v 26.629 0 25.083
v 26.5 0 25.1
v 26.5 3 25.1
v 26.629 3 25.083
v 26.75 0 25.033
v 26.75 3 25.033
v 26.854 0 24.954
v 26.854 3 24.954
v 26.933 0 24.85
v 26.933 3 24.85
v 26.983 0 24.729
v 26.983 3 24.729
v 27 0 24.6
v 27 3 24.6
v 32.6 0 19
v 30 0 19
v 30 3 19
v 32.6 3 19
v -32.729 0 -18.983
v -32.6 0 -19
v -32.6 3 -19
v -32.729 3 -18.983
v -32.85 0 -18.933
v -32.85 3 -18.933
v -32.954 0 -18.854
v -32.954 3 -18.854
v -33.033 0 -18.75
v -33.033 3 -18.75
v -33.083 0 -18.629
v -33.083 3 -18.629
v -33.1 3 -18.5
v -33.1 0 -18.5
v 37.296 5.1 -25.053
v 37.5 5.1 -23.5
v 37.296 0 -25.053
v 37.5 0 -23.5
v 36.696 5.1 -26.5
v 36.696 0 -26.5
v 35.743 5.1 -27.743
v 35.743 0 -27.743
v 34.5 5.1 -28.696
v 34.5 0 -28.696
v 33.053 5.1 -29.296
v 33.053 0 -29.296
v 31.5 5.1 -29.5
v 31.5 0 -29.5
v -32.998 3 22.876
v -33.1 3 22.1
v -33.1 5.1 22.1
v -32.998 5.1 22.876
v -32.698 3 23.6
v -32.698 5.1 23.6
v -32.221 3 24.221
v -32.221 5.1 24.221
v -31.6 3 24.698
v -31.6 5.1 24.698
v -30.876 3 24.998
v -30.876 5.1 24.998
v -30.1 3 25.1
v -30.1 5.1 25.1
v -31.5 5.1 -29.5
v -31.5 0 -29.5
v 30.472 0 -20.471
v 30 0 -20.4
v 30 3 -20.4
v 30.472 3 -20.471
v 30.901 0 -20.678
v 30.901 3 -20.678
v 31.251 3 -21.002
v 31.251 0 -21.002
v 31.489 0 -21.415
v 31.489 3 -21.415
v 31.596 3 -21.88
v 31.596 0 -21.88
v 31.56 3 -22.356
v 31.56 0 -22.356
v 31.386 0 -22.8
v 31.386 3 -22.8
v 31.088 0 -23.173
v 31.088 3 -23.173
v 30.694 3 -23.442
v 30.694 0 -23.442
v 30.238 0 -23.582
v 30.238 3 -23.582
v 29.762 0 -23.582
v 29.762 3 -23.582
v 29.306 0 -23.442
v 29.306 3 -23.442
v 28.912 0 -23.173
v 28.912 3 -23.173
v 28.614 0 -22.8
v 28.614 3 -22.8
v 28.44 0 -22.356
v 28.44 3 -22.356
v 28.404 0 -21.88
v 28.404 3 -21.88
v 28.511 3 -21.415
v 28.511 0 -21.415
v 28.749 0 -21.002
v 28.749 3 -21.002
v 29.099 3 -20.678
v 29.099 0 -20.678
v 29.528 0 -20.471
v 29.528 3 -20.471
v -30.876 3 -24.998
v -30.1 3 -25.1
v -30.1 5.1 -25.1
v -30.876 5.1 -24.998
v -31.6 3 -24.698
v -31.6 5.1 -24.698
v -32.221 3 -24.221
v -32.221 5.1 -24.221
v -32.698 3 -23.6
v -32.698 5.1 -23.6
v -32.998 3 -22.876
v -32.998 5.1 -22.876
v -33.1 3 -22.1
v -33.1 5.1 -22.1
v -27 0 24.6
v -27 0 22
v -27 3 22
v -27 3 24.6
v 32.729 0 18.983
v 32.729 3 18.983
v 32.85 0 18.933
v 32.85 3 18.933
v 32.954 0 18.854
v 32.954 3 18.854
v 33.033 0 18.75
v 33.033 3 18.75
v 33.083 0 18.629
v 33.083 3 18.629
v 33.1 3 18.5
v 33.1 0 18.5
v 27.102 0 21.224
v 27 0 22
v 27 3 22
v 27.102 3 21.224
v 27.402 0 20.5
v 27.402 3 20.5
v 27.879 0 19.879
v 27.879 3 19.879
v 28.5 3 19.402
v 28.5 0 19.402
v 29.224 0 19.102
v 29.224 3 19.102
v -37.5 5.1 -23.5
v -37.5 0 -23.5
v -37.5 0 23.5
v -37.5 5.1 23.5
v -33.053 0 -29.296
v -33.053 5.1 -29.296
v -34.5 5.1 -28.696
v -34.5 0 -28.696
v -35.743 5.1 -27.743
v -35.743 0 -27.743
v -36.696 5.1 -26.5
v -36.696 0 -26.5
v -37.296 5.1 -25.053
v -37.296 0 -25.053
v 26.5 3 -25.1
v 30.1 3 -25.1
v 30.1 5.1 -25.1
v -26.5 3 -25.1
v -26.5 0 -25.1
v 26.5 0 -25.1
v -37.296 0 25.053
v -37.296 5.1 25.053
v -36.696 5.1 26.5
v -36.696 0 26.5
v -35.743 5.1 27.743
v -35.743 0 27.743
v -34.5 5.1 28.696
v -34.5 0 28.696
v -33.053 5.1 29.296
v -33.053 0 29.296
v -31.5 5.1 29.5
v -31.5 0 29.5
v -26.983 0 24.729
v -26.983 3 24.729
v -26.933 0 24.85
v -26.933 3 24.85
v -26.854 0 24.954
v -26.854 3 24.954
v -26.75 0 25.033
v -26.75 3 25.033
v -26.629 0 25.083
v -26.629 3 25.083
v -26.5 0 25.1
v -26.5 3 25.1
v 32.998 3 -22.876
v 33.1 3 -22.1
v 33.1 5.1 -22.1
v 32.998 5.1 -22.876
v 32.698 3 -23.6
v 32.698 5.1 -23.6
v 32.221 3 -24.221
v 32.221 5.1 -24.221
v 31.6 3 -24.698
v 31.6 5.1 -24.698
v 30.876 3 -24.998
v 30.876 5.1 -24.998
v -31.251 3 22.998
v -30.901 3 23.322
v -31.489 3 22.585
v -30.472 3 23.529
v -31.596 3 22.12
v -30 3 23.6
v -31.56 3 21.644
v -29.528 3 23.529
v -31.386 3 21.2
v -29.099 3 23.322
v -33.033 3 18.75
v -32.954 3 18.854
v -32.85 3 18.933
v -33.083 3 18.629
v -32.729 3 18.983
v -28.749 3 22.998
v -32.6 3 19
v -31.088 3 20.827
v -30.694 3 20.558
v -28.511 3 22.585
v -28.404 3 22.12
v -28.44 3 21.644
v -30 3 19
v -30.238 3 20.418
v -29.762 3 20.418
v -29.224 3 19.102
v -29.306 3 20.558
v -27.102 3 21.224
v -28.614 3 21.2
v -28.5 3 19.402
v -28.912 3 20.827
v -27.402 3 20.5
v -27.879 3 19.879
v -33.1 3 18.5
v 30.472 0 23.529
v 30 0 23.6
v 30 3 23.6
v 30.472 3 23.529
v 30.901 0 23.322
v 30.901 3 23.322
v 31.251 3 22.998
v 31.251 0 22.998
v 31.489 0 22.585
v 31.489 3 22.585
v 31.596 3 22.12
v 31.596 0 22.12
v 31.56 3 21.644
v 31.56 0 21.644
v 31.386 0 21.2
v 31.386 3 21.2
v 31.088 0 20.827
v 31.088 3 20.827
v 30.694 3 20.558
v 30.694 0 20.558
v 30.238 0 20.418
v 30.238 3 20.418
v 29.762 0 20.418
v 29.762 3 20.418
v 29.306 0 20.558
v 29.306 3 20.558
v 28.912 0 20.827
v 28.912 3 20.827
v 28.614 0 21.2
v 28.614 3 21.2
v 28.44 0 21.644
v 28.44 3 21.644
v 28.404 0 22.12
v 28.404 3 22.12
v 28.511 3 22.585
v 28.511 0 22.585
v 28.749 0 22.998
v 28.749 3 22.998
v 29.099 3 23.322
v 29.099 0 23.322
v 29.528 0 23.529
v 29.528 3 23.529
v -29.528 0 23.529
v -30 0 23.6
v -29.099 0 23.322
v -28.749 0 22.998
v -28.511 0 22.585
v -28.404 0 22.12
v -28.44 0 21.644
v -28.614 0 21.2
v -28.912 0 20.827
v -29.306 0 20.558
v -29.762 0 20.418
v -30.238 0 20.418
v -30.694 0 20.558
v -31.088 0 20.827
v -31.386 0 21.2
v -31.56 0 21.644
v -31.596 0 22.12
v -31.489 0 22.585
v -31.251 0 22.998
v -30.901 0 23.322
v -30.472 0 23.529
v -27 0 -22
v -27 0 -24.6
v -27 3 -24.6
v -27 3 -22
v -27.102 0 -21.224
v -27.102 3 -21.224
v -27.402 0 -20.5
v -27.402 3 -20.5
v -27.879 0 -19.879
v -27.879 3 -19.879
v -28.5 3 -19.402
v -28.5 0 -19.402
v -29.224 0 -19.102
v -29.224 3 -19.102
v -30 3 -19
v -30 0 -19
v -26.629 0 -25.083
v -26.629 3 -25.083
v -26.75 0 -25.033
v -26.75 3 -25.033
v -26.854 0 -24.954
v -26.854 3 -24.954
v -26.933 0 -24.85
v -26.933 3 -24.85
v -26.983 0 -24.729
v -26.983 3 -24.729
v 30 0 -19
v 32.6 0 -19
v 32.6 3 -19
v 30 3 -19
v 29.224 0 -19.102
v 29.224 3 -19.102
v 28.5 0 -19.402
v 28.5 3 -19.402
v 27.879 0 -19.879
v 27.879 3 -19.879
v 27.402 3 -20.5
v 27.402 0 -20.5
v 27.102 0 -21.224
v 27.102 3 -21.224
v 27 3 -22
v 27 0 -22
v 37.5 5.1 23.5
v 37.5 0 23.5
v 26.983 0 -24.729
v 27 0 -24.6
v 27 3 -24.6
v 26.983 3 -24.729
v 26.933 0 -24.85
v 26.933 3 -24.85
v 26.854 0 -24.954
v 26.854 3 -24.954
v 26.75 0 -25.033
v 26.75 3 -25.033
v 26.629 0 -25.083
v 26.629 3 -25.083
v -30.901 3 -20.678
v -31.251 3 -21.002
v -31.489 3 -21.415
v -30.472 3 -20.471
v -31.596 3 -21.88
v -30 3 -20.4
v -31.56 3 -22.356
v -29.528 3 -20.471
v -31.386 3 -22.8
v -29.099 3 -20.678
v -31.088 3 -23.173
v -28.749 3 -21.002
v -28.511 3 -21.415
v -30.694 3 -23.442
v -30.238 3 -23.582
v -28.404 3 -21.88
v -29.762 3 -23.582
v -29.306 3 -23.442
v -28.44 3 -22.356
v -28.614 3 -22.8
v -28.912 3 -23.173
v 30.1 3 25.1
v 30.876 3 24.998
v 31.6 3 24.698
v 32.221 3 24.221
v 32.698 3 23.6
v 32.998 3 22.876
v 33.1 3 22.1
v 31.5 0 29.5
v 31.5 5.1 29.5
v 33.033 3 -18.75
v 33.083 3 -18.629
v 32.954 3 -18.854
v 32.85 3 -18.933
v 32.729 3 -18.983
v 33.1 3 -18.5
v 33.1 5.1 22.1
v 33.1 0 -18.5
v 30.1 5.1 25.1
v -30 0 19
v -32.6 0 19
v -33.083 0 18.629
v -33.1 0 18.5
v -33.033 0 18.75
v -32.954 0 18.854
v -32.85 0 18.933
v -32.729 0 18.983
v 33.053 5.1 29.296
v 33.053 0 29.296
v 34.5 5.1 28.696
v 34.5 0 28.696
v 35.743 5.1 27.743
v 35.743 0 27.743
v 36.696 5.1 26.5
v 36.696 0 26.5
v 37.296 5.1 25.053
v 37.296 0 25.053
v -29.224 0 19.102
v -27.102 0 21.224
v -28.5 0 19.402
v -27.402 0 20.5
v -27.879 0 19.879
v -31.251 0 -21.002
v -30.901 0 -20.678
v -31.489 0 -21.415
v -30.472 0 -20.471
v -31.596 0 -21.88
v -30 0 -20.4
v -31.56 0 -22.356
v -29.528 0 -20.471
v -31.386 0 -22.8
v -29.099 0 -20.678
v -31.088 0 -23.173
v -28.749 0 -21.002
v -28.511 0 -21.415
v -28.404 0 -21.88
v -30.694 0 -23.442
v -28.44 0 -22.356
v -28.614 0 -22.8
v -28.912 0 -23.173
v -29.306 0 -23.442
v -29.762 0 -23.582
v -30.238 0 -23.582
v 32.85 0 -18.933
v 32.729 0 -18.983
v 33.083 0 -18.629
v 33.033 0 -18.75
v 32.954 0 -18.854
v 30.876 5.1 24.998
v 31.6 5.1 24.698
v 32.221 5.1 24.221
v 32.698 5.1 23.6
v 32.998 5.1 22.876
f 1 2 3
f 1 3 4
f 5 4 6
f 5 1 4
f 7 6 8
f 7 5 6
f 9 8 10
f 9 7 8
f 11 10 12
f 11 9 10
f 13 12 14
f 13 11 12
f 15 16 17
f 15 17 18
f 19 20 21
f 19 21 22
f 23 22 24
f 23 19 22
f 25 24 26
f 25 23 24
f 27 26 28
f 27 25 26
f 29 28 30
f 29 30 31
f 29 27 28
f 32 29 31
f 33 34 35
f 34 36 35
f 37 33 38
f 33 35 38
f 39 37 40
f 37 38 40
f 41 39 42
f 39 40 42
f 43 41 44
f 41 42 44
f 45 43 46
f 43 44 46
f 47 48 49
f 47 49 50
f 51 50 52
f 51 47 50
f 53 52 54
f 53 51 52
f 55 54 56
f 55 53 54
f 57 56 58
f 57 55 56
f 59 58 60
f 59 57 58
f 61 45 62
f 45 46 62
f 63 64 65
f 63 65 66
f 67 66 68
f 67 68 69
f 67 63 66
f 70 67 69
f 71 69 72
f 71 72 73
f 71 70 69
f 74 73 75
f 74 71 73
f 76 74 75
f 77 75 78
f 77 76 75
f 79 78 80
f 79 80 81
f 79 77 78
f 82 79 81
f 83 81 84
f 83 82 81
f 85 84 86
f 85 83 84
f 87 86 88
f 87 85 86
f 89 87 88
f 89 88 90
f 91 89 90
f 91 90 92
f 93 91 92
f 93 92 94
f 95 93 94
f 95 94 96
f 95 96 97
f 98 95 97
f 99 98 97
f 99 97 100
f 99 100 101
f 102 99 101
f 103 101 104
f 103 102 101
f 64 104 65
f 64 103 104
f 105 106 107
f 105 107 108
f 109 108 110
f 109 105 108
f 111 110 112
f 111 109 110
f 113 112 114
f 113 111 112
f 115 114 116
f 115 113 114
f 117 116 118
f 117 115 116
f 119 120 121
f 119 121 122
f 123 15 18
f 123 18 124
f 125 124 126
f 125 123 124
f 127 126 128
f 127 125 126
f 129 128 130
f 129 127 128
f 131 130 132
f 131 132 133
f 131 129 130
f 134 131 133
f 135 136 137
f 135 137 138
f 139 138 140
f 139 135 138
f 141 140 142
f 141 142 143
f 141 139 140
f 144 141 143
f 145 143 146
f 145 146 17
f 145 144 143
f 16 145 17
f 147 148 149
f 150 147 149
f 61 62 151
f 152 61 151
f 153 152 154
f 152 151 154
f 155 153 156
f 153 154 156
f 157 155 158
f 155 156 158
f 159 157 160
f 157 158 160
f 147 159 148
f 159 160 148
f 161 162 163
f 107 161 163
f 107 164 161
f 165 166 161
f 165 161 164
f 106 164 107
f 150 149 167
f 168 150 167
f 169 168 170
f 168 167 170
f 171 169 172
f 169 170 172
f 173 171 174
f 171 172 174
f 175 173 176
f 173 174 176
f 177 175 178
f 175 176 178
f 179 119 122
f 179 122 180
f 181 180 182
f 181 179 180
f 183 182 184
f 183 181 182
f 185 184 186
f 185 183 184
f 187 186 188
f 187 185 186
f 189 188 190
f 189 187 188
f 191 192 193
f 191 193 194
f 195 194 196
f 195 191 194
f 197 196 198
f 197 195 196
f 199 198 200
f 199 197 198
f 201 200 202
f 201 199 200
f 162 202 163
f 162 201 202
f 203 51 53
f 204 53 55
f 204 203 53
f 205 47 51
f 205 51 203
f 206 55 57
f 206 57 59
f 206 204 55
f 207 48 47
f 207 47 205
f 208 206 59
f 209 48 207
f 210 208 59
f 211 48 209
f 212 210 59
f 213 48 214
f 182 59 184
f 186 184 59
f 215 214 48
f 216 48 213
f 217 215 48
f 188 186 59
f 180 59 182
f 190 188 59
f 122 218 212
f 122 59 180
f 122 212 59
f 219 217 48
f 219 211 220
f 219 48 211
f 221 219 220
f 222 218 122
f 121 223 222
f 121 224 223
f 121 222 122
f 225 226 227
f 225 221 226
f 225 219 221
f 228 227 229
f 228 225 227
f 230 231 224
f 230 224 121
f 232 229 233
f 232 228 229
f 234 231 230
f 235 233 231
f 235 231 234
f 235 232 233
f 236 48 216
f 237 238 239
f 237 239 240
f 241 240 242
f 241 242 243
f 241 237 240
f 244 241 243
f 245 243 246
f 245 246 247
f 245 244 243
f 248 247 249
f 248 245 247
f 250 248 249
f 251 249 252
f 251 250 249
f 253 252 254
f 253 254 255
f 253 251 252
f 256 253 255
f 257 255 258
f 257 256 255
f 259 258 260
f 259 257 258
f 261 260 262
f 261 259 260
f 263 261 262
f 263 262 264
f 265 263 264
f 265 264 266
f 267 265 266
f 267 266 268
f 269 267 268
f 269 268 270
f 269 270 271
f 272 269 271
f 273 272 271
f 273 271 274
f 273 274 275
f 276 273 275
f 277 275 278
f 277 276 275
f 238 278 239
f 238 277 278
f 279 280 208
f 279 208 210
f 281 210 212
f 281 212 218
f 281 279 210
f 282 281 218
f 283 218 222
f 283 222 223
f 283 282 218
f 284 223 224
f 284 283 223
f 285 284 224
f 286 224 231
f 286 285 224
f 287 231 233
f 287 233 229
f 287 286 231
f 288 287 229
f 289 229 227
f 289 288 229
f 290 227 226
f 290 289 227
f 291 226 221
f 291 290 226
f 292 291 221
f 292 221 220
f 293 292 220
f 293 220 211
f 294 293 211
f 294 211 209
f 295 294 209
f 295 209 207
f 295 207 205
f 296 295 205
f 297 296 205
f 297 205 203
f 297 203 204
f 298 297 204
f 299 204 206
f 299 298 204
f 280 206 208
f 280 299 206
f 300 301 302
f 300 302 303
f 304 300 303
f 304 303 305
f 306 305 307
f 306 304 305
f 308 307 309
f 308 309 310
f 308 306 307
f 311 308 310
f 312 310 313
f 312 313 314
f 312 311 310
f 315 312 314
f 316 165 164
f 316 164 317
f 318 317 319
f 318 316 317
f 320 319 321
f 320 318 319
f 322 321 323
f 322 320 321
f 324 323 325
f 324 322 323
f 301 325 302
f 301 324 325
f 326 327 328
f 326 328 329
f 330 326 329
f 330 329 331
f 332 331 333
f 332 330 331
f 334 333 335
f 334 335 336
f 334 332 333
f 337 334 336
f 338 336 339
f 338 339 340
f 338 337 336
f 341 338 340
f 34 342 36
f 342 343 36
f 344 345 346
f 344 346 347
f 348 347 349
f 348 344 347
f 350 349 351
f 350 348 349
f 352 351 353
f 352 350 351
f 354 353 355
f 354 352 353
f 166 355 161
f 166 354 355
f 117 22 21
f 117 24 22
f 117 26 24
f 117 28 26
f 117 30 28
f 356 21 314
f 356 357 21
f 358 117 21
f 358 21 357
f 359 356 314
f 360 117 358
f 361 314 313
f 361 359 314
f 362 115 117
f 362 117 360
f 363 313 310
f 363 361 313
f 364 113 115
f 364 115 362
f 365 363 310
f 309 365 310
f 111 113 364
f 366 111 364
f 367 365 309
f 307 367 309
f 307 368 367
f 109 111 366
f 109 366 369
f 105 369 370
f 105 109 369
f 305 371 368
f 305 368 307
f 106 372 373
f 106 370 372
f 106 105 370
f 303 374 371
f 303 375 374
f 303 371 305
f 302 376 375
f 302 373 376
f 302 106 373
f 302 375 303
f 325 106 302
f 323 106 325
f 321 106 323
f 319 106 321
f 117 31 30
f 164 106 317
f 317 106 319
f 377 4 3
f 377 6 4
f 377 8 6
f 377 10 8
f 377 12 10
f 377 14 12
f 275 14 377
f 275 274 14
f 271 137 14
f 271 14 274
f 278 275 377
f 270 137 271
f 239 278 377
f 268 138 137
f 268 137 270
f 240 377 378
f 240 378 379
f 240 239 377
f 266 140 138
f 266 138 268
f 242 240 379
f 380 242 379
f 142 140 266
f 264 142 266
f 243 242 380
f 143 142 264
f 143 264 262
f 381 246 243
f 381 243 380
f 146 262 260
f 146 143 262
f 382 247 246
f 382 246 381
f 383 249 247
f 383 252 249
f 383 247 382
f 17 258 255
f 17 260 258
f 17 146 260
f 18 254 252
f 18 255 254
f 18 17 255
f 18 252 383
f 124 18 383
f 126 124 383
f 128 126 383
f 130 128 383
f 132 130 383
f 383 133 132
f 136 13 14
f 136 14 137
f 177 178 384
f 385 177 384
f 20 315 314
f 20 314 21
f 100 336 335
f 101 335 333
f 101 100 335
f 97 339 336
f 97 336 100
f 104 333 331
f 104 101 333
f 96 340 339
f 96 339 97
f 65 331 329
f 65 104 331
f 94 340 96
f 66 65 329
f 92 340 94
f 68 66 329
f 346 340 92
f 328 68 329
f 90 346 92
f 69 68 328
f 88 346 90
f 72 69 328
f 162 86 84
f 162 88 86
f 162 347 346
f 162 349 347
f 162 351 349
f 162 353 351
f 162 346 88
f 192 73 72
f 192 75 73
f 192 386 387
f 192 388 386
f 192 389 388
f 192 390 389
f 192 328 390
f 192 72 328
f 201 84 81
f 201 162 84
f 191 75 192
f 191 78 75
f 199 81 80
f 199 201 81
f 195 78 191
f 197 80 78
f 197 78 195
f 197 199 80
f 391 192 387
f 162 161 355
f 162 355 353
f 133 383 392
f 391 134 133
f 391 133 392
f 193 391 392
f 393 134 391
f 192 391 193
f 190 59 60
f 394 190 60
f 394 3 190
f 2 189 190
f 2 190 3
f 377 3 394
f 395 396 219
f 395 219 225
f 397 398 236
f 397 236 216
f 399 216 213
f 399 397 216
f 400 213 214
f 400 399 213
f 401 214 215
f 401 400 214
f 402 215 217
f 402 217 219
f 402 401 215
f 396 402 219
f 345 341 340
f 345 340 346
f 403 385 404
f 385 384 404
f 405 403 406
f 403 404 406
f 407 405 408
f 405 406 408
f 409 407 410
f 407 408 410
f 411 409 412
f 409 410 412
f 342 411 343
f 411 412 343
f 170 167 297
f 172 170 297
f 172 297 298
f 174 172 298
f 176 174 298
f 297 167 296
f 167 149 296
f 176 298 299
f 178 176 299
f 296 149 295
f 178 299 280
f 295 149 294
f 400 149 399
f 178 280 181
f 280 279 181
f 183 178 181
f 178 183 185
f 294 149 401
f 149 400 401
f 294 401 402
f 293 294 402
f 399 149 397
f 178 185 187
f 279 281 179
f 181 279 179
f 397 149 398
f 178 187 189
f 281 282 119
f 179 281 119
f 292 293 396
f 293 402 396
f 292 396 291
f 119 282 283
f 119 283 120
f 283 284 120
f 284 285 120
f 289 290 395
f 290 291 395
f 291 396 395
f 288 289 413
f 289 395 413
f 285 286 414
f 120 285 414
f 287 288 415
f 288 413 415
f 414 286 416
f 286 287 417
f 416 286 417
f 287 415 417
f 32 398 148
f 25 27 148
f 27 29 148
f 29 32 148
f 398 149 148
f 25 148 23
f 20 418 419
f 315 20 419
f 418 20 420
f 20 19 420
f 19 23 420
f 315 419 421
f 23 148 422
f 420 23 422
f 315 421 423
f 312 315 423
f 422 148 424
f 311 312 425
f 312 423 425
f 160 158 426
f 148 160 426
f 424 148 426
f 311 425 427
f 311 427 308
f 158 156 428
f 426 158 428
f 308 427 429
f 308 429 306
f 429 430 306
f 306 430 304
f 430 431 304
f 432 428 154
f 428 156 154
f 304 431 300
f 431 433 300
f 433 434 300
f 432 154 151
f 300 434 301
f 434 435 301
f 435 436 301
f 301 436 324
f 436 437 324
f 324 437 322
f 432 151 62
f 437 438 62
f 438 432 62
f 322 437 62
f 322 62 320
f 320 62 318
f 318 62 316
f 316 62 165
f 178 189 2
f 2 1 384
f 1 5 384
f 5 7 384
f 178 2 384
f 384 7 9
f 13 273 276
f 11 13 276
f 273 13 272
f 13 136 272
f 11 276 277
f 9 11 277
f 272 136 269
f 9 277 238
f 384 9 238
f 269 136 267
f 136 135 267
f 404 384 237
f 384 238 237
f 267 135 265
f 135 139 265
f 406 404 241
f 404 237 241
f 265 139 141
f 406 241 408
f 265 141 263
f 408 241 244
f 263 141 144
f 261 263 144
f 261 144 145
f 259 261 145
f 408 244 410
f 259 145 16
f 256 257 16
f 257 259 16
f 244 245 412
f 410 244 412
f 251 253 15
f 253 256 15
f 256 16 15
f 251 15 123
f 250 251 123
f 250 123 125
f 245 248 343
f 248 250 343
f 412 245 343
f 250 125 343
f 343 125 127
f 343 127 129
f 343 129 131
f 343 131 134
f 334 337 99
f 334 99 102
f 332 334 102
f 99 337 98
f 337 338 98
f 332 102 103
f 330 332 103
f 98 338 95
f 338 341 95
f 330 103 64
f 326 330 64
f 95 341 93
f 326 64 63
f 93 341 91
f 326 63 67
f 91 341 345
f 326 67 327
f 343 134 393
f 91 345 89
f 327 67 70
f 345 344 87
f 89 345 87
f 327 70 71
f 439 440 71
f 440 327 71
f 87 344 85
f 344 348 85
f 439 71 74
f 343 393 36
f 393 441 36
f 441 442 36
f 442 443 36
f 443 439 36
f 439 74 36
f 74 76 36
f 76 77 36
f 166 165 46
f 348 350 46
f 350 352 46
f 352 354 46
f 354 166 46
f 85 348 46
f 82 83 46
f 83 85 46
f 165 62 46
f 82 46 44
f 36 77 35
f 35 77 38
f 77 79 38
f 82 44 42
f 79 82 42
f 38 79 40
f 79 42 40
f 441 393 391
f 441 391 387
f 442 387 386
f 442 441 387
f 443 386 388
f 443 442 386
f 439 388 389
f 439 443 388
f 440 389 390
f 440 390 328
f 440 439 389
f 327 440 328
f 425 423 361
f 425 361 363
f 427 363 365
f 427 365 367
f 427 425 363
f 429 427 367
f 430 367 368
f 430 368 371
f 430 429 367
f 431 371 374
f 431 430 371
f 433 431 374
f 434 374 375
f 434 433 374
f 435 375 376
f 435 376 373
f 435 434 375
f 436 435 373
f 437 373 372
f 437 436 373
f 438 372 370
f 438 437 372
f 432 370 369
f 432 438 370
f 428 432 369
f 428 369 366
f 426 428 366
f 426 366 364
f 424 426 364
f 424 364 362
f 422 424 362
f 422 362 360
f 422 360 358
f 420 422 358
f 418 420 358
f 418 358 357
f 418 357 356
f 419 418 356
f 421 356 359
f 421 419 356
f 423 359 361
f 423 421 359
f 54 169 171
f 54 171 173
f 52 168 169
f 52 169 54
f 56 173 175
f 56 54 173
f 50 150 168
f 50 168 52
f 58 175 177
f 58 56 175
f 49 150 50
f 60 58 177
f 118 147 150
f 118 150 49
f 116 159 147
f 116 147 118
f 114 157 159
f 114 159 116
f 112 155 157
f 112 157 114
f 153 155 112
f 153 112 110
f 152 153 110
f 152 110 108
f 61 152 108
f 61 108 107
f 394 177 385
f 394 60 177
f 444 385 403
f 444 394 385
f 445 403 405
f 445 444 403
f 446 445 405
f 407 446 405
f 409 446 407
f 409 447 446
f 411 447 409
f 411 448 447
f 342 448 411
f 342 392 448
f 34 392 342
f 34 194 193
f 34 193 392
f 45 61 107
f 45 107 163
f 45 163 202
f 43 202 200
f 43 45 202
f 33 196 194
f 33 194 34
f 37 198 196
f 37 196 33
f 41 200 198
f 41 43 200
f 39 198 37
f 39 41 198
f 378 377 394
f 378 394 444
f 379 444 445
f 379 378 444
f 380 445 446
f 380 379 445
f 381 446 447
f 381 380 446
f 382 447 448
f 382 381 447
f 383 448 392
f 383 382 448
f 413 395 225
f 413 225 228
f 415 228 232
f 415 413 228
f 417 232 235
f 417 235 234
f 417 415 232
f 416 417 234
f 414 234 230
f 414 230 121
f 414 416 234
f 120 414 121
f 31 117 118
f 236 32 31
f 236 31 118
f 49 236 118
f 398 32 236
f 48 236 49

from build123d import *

# Parameters (mm, degrees)
SKETCH1_R           = 1.6
BOSS_EXTRUDE1_DEPTH = 3
BOSS_EXTRUDE2_DEPTH = 2.1


with BuildPart() as part:
    # Sketch1 → Boss-Extrude1 (new body)
    with BuildSketch(Plane(origin=(0, 0, 0), x_dir=(1, 0, 0), z_dir=(0, 1, 0))):
        with BuildLine():
            Line((-31.5, -29.5), (31.5, -29.5))
            ThreePointArc((31.5, -29.5), (35.742640687, -27.742640687), (37.5, -23.5))
            Line((37.5, -23.5), (37.5, 23.5))
            ThreePointArc((37.5, 23.5), (35.742640687, 27.742640687), (31.5, 29.5))
            Line((31.5, 29.5), (-31.5, 29.5))
            ThreePointArc((-31.5, 29.5), (-35.742640687, 27.742640687), (-37.5, 23.5))
            Line((-37.5, 23.5), (-37.5, -23.5))
            ThreePointArc((-37.5, -23.5), (-35.742640687, -27.742640687), (-31.5, -29.5))
        make_face()
        with Locations(Location((-30, 22, 0), (0, 0, 270))):
            Circle(SKETCH1_R, mode=Mode.SUBTRACT)
        with Locations(Location((30, 22, 0), (0, 0, 270))):
            Circle(SKETCH1_R, mode=Mode.SUBTRACT)
        with Locations(Location((30, -22, 0), (0, 0, 270))):
            Circle(SKETCH1_R, mode=Mode.SUBTRACT)
        with Locations(Location((-30, -22, 0), (0, 0, 270))):
            Circle(SKETCH1_R, mode=Mode.SUBTRACT)
        with BuildLine():
            Line((-27, -22), (-27, -24.6))
            ThreePointArc((-27, -24.6), (-26.853553391, -24.953553391), (-26.5, -25.1))
            Line((-26.5, -25.1), (26.5, -25.1))
            ThreePointArc((26.5, -25.1), (26.853553391, -24.953553391), (27, -24.6))
            Line((27, -24.6), (27, -22))
            ThreePointArc((27, -22), (27.878679656, -19.878679656), (30, -19))
            Line((30, -19), (32.6, -19))
            ThreePointArc((32.6, -19), (32.953553391, -18.853553391), (33.1, -18.5))
            Line((33.1, -18.5), (33.1, 18.5))
            ThreePointArc((33.1, 18.5), (32.953553391, 18.853553391), (32.6, 19))
            Line((32.6, 19), (30, 19))
            ThreePointArc((30, 19), (27.878679656, 19.878679656), (27, 22))
            Line((27, 22), (27, 24.6))
            ThreePointArc((27, 24.6), (26.853553391, 24.953553391), (26.5, 25.1))
            Line((26.5, 25.1), (-26.5, 25.1))
            ThreePointArc((-26.5, 25.1), (-26.853553391, 24.953553391), (-27, 24.6))
            Line((-27, 24.6), (-27, 22))
            ThreePointArc((-27, 22), (-27.878679656, 19.878679656), (-30, 19))
            Line((-30, 19), (-32.6, 19))
            ThreePointArc((-32.6, 19), (-32.953553391, 18.853553391), (-33.1, 18.5))
            Line((-33.1, 18.5), (-33.1, -18.5))
            ThreePointArc((-33.1, -18.5), (-32.953553391, -18.853553391), (-32.6, -19))
            Line((-32.6, -19), (-30, -19))
            ThreePointArc((-30, -19), (-27.878679656, -19.878679656), (-27, -22))
        make_face(mode=Mode.SUBTRACT)
    extrude(amount=BOSS_EXTRUDE1_DEPTH)

    # Sketch2 → Boss-Extrude2 (add)
    with BuildSketch(Plane(origin=(0, 3, 0), x_dir=(1, 0, 0), z_dir=(0, 1, 0))):
        with BuildLine():
            Line((-31.5, -29.5), (31.5, -29.5))
            ThreePointArc((31.5, -29.5), (35.742640687, -27.742640687), (37.5, -23.5))
            Line((37.5, -23.5), (37.5, 23.5))
            ThreePointArc((37.5, 23.5), (35.742640687, 27.742640687), (31.5, 29.5))
            Line((31.5, 29.5), (-31.5, 29.5))
            ThreePointArc((-31.5, 29.5), (-35.742640687, 27.742640687), (-37.5, 23.5))
            Line((-37.5, 23.5), (-37.5, -23.5))
            ThreePointArc((-37.5, -23.5), (-35.742640687, -27.742640687), (-31.5, -29.5))
        make_face()
        with BuildLine():
            Line((-30.1, -25.1), (30.1, -25.1))
            ThreePointArc((30.1, -25.1), (32.221320344, -24.221320344), (33.1, -22.1))
            Line((33.1, -22.1), (33.1, 22.1))
            ThreePointArc((33.1, 22.1), (32.221320344, 24.221320344), (30.1, 25.1))
            Line((30.1, 25.1), (-30.1, 25.1))
            ThreePointArc((-30.1, 25.1), (-32.221320344, 24.221320344), (-33.1, 22.1))
            Line((-33.1, 22.1), (-33.1, -22.1))
            ThreePointArc((-33.1, -22.1), (-32.221320344, -24.221320344), (-30.1, -25.1))
        make_face(mode=Mode.SUBTRACT)
    extrude(amount=BOSS_EXTRUDE2_DEPTH)


solid = part.part
